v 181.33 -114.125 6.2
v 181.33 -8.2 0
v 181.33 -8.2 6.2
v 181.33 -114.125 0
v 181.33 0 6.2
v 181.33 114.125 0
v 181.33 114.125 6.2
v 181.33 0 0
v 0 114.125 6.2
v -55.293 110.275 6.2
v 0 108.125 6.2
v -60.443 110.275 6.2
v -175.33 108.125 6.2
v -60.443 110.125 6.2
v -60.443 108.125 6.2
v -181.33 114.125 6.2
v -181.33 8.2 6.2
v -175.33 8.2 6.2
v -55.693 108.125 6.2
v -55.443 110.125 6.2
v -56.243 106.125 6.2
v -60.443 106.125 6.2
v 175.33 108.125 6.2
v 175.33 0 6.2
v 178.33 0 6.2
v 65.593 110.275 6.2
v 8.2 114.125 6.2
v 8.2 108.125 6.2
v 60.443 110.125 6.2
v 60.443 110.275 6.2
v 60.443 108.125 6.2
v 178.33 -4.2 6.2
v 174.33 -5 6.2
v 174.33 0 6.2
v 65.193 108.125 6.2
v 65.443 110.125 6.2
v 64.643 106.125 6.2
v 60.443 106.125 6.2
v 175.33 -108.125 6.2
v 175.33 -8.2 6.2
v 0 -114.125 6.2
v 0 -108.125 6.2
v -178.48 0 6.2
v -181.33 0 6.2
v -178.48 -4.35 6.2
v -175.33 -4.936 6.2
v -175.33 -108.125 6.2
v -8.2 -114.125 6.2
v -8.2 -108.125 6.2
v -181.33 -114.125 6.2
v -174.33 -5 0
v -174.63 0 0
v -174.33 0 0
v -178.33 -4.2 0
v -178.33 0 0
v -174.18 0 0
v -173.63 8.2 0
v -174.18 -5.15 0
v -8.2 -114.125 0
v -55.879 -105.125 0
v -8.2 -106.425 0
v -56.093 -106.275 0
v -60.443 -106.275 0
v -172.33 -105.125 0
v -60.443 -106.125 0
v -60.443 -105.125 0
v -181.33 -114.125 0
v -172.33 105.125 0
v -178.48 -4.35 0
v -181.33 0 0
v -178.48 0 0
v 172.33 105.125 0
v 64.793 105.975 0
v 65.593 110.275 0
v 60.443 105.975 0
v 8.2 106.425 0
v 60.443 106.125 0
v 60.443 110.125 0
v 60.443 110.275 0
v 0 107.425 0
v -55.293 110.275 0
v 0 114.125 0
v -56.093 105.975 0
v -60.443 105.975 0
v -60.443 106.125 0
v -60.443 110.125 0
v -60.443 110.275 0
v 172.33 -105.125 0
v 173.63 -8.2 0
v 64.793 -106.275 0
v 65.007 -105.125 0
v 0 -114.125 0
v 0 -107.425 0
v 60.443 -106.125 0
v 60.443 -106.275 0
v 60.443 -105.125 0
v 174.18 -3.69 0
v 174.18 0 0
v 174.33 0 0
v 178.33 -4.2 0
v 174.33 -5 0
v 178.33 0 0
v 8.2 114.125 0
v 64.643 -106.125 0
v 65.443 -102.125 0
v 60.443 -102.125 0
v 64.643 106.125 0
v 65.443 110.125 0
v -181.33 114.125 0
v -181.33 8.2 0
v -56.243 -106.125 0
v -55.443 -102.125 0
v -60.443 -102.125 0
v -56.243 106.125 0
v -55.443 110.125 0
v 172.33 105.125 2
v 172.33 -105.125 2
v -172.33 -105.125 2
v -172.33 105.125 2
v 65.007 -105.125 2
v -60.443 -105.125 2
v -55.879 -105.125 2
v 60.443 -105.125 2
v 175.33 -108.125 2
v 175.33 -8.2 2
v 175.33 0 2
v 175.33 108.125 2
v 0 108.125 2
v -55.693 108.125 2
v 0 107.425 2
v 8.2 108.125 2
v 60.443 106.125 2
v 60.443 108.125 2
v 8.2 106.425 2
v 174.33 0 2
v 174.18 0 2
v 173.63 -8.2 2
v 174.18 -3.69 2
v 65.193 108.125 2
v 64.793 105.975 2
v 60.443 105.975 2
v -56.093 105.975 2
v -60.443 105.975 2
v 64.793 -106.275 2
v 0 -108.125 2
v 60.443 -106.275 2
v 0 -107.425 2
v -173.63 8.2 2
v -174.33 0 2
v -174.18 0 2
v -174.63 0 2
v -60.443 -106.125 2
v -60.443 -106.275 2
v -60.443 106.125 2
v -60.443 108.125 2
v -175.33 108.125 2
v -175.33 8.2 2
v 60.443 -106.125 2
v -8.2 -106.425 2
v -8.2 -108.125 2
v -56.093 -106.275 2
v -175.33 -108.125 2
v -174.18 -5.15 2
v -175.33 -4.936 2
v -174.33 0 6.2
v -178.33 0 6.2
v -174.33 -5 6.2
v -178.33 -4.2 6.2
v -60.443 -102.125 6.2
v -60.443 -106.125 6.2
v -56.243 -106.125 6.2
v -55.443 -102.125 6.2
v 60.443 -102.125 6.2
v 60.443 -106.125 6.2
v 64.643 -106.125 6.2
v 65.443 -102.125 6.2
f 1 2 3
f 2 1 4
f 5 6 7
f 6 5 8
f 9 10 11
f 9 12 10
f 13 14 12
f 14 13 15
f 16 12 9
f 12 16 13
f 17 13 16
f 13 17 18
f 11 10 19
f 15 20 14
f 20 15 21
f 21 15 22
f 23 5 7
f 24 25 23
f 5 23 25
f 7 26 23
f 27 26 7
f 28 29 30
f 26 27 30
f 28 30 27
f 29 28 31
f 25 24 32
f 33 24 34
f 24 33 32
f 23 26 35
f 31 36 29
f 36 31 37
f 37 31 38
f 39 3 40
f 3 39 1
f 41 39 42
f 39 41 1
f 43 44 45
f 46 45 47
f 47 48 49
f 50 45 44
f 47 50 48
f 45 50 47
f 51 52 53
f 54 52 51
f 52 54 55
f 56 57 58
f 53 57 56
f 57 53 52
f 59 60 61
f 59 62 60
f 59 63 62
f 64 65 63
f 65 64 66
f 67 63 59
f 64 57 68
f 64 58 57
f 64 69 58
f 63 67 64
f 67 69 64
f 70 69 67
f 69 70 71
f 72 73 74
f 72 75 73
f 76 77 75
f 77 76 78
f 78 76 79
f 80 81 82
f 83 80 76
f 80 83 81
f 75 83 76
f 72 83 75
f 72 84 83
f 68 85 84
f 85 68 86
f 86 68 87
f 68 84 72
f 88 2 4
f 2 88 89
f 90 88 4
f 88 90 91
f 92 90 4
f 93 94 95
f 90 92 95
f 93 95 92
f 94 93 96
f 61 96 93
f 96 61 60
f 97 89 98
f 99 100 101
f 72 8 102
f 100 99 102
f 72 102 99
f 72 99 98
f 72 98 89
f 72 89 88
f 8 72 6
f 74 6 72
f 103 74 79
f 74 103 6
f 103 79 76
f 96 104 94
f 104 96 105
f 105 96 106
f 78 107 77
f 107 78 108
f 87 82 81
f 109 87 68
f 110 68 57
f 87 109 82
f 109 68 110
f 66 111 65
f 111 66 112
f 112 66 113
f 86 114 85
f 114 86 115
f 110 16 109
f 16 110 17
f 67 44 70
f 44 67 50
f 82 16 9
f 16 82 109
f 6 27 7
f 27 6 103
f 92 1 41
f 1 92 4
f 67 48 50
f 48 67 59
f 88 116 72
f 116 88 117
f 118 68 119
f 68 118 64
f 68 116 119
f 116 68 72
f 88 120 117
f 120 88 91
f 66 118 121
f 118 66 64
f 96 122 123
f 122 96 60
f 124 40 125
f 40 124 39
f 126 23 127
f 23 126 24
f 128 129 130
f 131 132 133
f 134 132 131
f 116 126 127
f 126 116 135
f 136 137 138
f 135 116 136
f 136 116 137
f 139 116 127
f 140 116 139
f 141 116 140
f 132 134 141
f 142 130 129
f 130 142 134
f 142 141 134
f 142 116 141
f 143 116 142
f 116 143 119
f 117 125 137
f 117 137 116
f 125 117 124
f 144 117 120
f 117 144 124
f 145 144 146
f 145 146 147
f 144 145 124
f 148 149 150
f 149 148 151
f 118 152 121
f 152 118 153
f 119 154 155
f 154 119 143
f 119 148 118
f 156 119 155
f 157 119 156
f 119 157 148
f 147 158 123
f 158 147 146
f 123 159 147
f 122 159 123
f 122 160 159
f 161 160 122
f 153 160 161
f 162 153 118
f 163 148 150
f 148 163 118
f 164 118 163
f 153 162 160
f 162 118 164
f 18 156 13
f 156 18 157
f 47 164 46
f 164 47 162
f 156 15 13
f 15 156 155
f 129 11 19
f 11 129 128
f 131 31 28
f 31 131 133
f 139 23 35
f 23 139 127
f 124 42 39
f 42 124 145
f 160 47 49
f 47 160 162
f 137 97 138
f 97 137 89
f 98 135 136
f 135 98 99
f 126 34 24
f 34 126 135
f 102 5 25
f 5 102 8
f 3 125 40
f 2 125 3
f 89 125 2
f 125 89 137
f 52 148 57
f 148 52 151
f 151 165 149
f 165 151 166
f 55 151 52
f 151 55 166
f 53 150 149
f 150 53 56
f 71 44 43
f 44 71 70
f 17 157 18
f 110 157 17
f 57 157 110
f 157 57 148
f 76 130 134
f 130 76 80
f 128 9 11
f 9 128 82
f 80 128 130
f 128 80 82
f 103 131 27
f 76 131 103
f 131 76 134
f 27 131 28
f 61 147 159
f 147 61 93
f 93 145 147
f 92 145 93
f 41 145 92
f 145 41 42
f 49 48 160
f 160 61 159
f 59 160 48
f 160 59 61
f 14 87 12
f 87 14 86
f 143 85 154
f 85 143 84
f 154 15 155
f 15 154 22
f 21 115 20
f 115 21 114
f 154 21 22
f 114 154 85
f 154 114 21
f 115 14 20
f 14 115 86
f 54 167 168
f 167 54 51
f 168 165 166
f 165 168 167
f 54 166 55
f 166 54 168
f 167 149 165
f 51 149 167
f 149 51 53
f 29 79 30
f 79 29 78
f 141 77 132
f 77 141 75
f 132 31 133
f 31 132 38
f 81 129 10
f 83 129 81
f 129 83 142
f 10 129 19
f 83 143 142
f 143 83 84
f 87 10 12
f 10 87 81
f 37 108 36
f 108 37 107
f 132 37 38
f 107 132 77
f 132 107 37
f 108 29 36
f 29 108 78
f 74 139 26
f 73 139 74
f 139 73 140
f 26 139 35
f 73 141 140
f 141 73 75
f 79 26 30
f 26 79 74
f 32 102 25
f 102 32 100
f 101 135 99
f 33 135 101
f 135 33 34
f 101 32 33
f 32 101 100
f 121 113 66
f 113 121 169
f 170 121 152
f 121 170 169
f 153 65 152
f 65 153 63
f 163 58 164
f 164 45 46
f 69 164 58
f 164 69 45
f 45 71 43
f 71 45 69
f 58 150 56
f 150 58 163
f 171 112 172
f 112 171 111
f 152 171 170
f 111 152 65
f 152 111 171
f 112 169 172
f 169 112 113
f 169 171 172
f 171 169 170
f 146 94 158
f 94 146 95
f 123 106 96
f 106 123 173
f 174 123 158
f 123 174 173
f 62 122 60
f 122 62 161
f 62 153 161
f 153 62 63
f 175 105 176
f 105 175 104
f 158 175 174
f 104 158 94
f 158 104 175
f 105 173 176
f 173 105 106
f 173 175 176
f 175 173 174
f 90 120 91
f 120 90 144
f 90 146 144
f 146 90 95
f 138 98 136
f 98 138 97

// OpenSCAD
// ============================================
// PiCanvas - 모델 A: 액자 프레임 (6분할 + 도브테일)
// ============================================
// 분할 전략:
//   긴 변(362.66mm): 3등분 → 각 ~120.9mm (< 180mm OK)
//   짧은 변(228.25mm): 2등분 → 각 ~114.1mm (< 180mm OK)
//   총 6개 세그먼트, 각 분할선에 도브테일 조인트

// --- 파라미터 ---

// LCD 디스플레이
lcd_w = 350.66;
lcd_h = 216.25;
lcd_d = 3.2;

// 프레임
frame_bezel = 3;          // 전면 오버랩 (mm)
frame_wall = 6;           // 프레임 벽 두께
frame_depth = lcd_d + 3;  // 총 깊이: LCD 두께 + 후면 여유
frame_lip_depth = 2;      // 전면 립 두께 (Z방향)

frame_outer_w = lcd_w + frame_wall * 2;  // 362.66
frame_outer_h = lcd_h + frame_wall * 2;  // 228.25

// 분할 경계
// X축: 3등분 → -frame_outer_w/2, -frame_outer_w/6, +frame_outer_w/6, +frame_outer_w/2
split_x1 = -frame_outer_w / 6;  // ~-60.44
split_x2 =  frame_outer_w / 6;  // ~+60.44
split_y  = 0;                     // Y축: 중앙에서 2등분

// 각 세그먼트 크기 검증
seg_w = frame_outer_w / 3;  // ~120.89 < 180 OK
seg_h = frame_outer_h / 2;  // ~114.13 < 180 OK

// 도브테일 (십자 보강재 연결용)
dt_width = 15;
dt_depth = 8;
dt_taper = 1;
dt_clearance = 0.2;

// 세그먼트간 도브테일 (프레임 분할선)
sdt_width = 10;
sdt_depth = 4;
sdt_taper = 0.8;
sdt_clearance = 0.15;

// --- 모듈 ---

// 십자 보강재용 도브테일 슬롯
module dovetail_slot() {
    w = dt_width + dt_clearance * 2;
    d = dt_depth + dt_clearance;
    translate([0, 0, -0.5])
    linear_extrude(height = frame_depth + 1)
        polygon([
            [-w/2 + dt_taper, 0],
            [w/2 - dt_taper, 0],
            [w/2, d],
            [-w/2, d]
        ]);
}

// 세그먼트간 도브테일 수 (male)
module seg_dovetail_male() {
    linear_extrude(height = frame_depth)
        polygon([
            [-sdt_width/2 + sdt_taper, 0],
            [sdt_width/2 - sdt_taper, 0],
            [sdt_width/2, sdt_depth],
            [-sdt_width/2, sdt_depth]
        ]);
}

// 세그먼트간 도브테일 암 (female) - 빼기용
module seg_dovetail_female() {
    c = sdt_clearance;
    w = sdt_width + c * 2;
    d = sdt_depth + c;
    translate([0, 0, -0.5])
    linear_extrude(height = frame_depth + 1)
        polygon([
            [-w/2 + sdt_taper, -c],
            [w/2 - sdt_taper, -c],
            [w/2, d],
            [-w/2, d]
        ]);
}

// X 분할선의 도브테일 (Y방향으로 배치)
// 상변/하변 프레임 벽에 각 1개
module x_split_dovetails_male(x_pos) {
    // 상변 프레임 벽 (Y+쪽)
    translate([x_pos, frame_outer_h/2 - frame_wall/2, 0])
        rotate([0, 0, 90])
            seg_dovetail_male();
    // 하변 프레임 벽 (Y-쪽)
    translate([x_pos, -(frame_outer_h/2 - frame_wall/2), 0])
        rotate([0, 0, -90])
            seg_dovetail_male();
}

module x_split_dovetails_female(x_pos) {
    translate([x_pos, frame_outer_h/2 - frame_wall/2, 0])
        rotate([0, 0, 90])
            seg_dovetail_female();
    translate([x_pos, -(frame_outer_h/2 - frame_wall/2), 0])
        rotate([0, 0, -90])
            seg_dovetail_female();
}

// Y 분할선의 도브테일 (X방향으로 배치)
// 좌변/우변 + 중간에도 배치
module y_split_dovetails_male(y_pos) {
    // 좌변 프레임 벽
    translate([-(frame_outer_w/2 - frame_wall/2), y_pos, 0])
        rotate([0, 0, 0])
            seg_dovetail_male();
    // 우변 프레임 벽
    translate([(frame_outer_w/2 - frame_wall/2), y_pos, 0])
        rotate([0, 0, 180])
            seg_dovetail_male();
}

module y_split_dovetails_female(y_pos) {
    translate([-(frame_outer_w/2 - frame_wall/2), y_pos, 0])
        rotate([0, 0, 0])
            seg_dovetail_female();
    translate([(frame_outer_w/2 - frame_wall/2), y_pos, 0])
        rotate([0, 0, 180])
            seg_dovetail_female();
}

// 전체 프레임 (분할 전)
module full_frame() {
    difference() {
        // 외부 쉘
        translate([-frame_outer_w/2, -frame_outer_h/2, 0])
            cube([frame_outer_w, frame_outer_h, frame_depth]);

        // LCD 개구부 (전면에서 bezel만큼 안쪽)
        translate([-(lcd_w - frame_bezel*2)/2, -(lcd_h - frame_bezel*2)/2, -0.1])
            cube([lcd_w - frame_bezel*2, lcd_h - frame_bezel*2, frame_lip_depth + 0.2]);

        // LCD 안착부 (립 뒤에 LCD 크기 홈)
        translate([-lcd_w/2, -lcd_h/2, frame_lip_depth])
            cube([lcd_w, lcd_h, frame_depth]);

        // 십자 보강재 도브테일 슬롯 - 4개
        translate([lcd_w/2 + frame_wall, 0, 0])
            rotate([0, 0, 180]) dovetail_slot();
        translate([-(lcd_w/2 + frame_wall), 0, 0])
            dovetail_slot();
        translate([0, lcd_h/2 + frame_wall, 0])
            rotate([0, 0, -90]) dovetail_slot();
        translate([0, -(lcd_h/2 + frame_wall), 0])
            rotate([0, 0, 90]) dovetail_slot();
    }
}

// 커팅 박스 (intersection용)
module cut_box(x_min, y_min, x_max, y_max) {
    translate([x_min, y_min, -1])
        cube([x_max - x_min, y_max - y_min, frame_depth + 2]);
}

// --- 6개 세그먼트 ---
// 배치: [TL][TC][TR] (상단 좌/중/우)
//        [BL][BC][BR] (하단 좌/중/우)

hw = frame_outer_w / 2;
hh = frame_outer_h / 2;

// 상단 좌 (TL): x=-hw ~ split_x1, y=0 ~ +hh
module frame_seg_TL() {
    difference() {
        union() {
            intersection() {
                full_frame();
                cut_box(-hw, 0, split_x1, hh);
            }
            // 도브테일 수: 오른쪽(split_x1)에 male → TC와 결합
            // 도브테일 수: 아래쪽(y=0)에 male → BL과 결합
        }
        // X분할선(split_x1): 이 세그먼트가 male 제공 → 없으면 female 빼기
        // Y분할선(y=0): 이 세그먼트가 male 제공
    }
    // X 분할: TL이 오른쪽에 male 돌출
    intersection() {
        translate([split_x1, hh - frame_wall/2 - sdt_width/2, 0])
            seg_dovetail_male();
        cut_box(split_x1, 0, split_x1 + sdt_depth + 1, hh);
    }
    // Y 분할: TL이 아래쪽에 male 돌출
    intersection() {
        translate([-(hw - frame_wall/2), 0, 0])
            rotate([0, 0, -90])
                seg_dovetail_male();
        cut_box(-hw, -sdt_depth - 1, split_x1, 0);
    }
}

// 상단 중앙 (TC): x=split_x1 ~ split_x2, y=0 ~ +hh
module frame_seg_TC() {
    difference() {
        intersection() {
            full_frame();
            cut_box(split_x1, 0, split_x2, hh);
        }
        // 왼쪽(split_x1)에 female: TL의 male을 받음
        translate([split_x1, hh - frame_wall/2 - sdt_width/2, 0])
            seg_dovetail_female();
    }
    // 오른쪽(split_x2)에 male: TR과 결합
    intersection() {
        translate([split_x2, hh - frame_wall/2 - sdt_width/2, 0])
            seg_dovetail_male();
        cut_box(split_x2, 0, split_x2 + sdt_depth + 1, hh);
    }
    // Y 분할: 아래쪽에 male → BC와 결합 (이 구간은 프레임 벽이 없으므로 생략)
}

// 상단 우 (TR): x=split_x2 ~ +hw, y=0 ~ +hh
module frame_seg_TR() {
    difference() {
        union() {
            intersection() {
                full_frame();
                cut_box(split_x2, 0, hw, hh);
            }
        }
        // 왼쪽(split_x2)에 female: TC의 male을 받음
        translate([split_x2, hh - frame_wall/2 - sdt_width/2, 0])
            seg_dovetail_female();
    }
    // Y 분할: 아래쪽에 male → BR과 결합
    intersection() {
        translate([(hw - frame_wall/2), 0, 0])
            rotate([0, 0, 90])
                seg_dovetail_male();
        cut_box(split_x2, -sdt_depth - 1, hw, 0);
    }
}

// 하단 좌 (BL): x=-hw ~ split_x1, y=-hh ~ 0
module frame_seg_BL() {
    difference() {
        intersection() {
            full_frame();
            cut_box(-hw, -hh, split_x1, 0);
        }
        // 위쪽(y=0)에 female: TL의 male을 받음
        translate([-(hw - frame_wall/2), 0, 0])
            rotate([0, 0, -90])
                seg_dovetail_female();
    }
    // 오른쪽(split_x1)에 male → BC와 결합
    intersection() {
        translate([split_x1, -(hh - frame_wall/2 - sdt_width/2), 0])
            seg_dovetail_male();
        cut_box(split_x1, -hh, split_x1 + sdt_depth + 1, 0);
    }
}

// 하단 중앙 (BC): x=split_x1 ~ split_x2, y=-hh ~ 0
module frame_seg_BC() {
    difference() {
        intersection() {
            full_frame();
            cut_box(split_x1, -hh, split_x2, 0);
        }
        // 왼쪽(split_x1)에 female: BL의 male을 받음
        translate([split_x1, -(hh - frame_wall/2 - sdt_width/2), 0])
            seg_dovetail_female();
    }
    // 오른쪽(split_x2)에 male → BR과 결합
    intersection() {
        translate([split_x2, -(hh - frame_wall/2 - sdt_width/2), 0])
            seg_dovetail_male();
        cut_box(split_x2, -hh, split_x2 + sdt_depth + 1, 0);
    }
}

// 하단 우 (BR): x=split_x2 ~ +hw, y=-hh ~ 0
module frame_seg_BR() {
    difference() {
        union() {
            intersection() {
                full_frame();
                cut_box(split_x2, -hh, hw, 0);
            }
        }
        // 왼쪽(split_x2)에 female: BC의 male을 받음
        translate([split_x2, -(hh - frame_wall/2 - sdt_width/2), 0])
            seg_dovetail_female();
        // 위쪽(y=0)에 female: TR의 male을 받음
        translate([(hw - frame_wall/2), 0, 0])
            rotate([0, 0, 90])
                seg_dovetail_female();
    }
}

// --- 메인: 어셈블리 뷰 ---

module model_a_frame_assembly() {
    color("SlateGray", 0.9)     frame_seg_TL();
    color("DarkSlateGray", 0.9) frame_seg_TC();
    color("SlateGray", 0.9)     frame_seg_TR();
    color("DarkSlateGray", 0.9) frame_seg_BL();
    color("SlateGray", 0.9)     frame_seg_BC();
    color("DarkSlateGray", 0.9) frame_seg_BR();
}

model_a_frame_assembly();

// 디버그: LCD 패널 (투명 빨강)
%color("Red", 0.3)
    translate([-lcd_w/2, -lcd_h/2, frame_lip_depth])
        cube([lcd_w, lcd_h, lcd_d]);

// 디버그: 분할선 표시
%color("Yellow", 0.3) {
    translate([split_x1, -hh, -0.5]) cube([0.5, frame_outer_h, frame_depth + 1]);
    translate([split_x2, -hh, -0.5]) cube([0.5, frame_outer_h, frame_depth + 1]);
    translate([-hw, -0.25, -0.5]) cube([frame_outer_w, 0.5, frame_depth + 1]);
}

echo(str("세그먼트 크기: ", seg_w, " x ", seg_h, " (180mm 이내: ", seg_w < 180 && seg_h < 180 ? "OK" : "NG", ")"));
